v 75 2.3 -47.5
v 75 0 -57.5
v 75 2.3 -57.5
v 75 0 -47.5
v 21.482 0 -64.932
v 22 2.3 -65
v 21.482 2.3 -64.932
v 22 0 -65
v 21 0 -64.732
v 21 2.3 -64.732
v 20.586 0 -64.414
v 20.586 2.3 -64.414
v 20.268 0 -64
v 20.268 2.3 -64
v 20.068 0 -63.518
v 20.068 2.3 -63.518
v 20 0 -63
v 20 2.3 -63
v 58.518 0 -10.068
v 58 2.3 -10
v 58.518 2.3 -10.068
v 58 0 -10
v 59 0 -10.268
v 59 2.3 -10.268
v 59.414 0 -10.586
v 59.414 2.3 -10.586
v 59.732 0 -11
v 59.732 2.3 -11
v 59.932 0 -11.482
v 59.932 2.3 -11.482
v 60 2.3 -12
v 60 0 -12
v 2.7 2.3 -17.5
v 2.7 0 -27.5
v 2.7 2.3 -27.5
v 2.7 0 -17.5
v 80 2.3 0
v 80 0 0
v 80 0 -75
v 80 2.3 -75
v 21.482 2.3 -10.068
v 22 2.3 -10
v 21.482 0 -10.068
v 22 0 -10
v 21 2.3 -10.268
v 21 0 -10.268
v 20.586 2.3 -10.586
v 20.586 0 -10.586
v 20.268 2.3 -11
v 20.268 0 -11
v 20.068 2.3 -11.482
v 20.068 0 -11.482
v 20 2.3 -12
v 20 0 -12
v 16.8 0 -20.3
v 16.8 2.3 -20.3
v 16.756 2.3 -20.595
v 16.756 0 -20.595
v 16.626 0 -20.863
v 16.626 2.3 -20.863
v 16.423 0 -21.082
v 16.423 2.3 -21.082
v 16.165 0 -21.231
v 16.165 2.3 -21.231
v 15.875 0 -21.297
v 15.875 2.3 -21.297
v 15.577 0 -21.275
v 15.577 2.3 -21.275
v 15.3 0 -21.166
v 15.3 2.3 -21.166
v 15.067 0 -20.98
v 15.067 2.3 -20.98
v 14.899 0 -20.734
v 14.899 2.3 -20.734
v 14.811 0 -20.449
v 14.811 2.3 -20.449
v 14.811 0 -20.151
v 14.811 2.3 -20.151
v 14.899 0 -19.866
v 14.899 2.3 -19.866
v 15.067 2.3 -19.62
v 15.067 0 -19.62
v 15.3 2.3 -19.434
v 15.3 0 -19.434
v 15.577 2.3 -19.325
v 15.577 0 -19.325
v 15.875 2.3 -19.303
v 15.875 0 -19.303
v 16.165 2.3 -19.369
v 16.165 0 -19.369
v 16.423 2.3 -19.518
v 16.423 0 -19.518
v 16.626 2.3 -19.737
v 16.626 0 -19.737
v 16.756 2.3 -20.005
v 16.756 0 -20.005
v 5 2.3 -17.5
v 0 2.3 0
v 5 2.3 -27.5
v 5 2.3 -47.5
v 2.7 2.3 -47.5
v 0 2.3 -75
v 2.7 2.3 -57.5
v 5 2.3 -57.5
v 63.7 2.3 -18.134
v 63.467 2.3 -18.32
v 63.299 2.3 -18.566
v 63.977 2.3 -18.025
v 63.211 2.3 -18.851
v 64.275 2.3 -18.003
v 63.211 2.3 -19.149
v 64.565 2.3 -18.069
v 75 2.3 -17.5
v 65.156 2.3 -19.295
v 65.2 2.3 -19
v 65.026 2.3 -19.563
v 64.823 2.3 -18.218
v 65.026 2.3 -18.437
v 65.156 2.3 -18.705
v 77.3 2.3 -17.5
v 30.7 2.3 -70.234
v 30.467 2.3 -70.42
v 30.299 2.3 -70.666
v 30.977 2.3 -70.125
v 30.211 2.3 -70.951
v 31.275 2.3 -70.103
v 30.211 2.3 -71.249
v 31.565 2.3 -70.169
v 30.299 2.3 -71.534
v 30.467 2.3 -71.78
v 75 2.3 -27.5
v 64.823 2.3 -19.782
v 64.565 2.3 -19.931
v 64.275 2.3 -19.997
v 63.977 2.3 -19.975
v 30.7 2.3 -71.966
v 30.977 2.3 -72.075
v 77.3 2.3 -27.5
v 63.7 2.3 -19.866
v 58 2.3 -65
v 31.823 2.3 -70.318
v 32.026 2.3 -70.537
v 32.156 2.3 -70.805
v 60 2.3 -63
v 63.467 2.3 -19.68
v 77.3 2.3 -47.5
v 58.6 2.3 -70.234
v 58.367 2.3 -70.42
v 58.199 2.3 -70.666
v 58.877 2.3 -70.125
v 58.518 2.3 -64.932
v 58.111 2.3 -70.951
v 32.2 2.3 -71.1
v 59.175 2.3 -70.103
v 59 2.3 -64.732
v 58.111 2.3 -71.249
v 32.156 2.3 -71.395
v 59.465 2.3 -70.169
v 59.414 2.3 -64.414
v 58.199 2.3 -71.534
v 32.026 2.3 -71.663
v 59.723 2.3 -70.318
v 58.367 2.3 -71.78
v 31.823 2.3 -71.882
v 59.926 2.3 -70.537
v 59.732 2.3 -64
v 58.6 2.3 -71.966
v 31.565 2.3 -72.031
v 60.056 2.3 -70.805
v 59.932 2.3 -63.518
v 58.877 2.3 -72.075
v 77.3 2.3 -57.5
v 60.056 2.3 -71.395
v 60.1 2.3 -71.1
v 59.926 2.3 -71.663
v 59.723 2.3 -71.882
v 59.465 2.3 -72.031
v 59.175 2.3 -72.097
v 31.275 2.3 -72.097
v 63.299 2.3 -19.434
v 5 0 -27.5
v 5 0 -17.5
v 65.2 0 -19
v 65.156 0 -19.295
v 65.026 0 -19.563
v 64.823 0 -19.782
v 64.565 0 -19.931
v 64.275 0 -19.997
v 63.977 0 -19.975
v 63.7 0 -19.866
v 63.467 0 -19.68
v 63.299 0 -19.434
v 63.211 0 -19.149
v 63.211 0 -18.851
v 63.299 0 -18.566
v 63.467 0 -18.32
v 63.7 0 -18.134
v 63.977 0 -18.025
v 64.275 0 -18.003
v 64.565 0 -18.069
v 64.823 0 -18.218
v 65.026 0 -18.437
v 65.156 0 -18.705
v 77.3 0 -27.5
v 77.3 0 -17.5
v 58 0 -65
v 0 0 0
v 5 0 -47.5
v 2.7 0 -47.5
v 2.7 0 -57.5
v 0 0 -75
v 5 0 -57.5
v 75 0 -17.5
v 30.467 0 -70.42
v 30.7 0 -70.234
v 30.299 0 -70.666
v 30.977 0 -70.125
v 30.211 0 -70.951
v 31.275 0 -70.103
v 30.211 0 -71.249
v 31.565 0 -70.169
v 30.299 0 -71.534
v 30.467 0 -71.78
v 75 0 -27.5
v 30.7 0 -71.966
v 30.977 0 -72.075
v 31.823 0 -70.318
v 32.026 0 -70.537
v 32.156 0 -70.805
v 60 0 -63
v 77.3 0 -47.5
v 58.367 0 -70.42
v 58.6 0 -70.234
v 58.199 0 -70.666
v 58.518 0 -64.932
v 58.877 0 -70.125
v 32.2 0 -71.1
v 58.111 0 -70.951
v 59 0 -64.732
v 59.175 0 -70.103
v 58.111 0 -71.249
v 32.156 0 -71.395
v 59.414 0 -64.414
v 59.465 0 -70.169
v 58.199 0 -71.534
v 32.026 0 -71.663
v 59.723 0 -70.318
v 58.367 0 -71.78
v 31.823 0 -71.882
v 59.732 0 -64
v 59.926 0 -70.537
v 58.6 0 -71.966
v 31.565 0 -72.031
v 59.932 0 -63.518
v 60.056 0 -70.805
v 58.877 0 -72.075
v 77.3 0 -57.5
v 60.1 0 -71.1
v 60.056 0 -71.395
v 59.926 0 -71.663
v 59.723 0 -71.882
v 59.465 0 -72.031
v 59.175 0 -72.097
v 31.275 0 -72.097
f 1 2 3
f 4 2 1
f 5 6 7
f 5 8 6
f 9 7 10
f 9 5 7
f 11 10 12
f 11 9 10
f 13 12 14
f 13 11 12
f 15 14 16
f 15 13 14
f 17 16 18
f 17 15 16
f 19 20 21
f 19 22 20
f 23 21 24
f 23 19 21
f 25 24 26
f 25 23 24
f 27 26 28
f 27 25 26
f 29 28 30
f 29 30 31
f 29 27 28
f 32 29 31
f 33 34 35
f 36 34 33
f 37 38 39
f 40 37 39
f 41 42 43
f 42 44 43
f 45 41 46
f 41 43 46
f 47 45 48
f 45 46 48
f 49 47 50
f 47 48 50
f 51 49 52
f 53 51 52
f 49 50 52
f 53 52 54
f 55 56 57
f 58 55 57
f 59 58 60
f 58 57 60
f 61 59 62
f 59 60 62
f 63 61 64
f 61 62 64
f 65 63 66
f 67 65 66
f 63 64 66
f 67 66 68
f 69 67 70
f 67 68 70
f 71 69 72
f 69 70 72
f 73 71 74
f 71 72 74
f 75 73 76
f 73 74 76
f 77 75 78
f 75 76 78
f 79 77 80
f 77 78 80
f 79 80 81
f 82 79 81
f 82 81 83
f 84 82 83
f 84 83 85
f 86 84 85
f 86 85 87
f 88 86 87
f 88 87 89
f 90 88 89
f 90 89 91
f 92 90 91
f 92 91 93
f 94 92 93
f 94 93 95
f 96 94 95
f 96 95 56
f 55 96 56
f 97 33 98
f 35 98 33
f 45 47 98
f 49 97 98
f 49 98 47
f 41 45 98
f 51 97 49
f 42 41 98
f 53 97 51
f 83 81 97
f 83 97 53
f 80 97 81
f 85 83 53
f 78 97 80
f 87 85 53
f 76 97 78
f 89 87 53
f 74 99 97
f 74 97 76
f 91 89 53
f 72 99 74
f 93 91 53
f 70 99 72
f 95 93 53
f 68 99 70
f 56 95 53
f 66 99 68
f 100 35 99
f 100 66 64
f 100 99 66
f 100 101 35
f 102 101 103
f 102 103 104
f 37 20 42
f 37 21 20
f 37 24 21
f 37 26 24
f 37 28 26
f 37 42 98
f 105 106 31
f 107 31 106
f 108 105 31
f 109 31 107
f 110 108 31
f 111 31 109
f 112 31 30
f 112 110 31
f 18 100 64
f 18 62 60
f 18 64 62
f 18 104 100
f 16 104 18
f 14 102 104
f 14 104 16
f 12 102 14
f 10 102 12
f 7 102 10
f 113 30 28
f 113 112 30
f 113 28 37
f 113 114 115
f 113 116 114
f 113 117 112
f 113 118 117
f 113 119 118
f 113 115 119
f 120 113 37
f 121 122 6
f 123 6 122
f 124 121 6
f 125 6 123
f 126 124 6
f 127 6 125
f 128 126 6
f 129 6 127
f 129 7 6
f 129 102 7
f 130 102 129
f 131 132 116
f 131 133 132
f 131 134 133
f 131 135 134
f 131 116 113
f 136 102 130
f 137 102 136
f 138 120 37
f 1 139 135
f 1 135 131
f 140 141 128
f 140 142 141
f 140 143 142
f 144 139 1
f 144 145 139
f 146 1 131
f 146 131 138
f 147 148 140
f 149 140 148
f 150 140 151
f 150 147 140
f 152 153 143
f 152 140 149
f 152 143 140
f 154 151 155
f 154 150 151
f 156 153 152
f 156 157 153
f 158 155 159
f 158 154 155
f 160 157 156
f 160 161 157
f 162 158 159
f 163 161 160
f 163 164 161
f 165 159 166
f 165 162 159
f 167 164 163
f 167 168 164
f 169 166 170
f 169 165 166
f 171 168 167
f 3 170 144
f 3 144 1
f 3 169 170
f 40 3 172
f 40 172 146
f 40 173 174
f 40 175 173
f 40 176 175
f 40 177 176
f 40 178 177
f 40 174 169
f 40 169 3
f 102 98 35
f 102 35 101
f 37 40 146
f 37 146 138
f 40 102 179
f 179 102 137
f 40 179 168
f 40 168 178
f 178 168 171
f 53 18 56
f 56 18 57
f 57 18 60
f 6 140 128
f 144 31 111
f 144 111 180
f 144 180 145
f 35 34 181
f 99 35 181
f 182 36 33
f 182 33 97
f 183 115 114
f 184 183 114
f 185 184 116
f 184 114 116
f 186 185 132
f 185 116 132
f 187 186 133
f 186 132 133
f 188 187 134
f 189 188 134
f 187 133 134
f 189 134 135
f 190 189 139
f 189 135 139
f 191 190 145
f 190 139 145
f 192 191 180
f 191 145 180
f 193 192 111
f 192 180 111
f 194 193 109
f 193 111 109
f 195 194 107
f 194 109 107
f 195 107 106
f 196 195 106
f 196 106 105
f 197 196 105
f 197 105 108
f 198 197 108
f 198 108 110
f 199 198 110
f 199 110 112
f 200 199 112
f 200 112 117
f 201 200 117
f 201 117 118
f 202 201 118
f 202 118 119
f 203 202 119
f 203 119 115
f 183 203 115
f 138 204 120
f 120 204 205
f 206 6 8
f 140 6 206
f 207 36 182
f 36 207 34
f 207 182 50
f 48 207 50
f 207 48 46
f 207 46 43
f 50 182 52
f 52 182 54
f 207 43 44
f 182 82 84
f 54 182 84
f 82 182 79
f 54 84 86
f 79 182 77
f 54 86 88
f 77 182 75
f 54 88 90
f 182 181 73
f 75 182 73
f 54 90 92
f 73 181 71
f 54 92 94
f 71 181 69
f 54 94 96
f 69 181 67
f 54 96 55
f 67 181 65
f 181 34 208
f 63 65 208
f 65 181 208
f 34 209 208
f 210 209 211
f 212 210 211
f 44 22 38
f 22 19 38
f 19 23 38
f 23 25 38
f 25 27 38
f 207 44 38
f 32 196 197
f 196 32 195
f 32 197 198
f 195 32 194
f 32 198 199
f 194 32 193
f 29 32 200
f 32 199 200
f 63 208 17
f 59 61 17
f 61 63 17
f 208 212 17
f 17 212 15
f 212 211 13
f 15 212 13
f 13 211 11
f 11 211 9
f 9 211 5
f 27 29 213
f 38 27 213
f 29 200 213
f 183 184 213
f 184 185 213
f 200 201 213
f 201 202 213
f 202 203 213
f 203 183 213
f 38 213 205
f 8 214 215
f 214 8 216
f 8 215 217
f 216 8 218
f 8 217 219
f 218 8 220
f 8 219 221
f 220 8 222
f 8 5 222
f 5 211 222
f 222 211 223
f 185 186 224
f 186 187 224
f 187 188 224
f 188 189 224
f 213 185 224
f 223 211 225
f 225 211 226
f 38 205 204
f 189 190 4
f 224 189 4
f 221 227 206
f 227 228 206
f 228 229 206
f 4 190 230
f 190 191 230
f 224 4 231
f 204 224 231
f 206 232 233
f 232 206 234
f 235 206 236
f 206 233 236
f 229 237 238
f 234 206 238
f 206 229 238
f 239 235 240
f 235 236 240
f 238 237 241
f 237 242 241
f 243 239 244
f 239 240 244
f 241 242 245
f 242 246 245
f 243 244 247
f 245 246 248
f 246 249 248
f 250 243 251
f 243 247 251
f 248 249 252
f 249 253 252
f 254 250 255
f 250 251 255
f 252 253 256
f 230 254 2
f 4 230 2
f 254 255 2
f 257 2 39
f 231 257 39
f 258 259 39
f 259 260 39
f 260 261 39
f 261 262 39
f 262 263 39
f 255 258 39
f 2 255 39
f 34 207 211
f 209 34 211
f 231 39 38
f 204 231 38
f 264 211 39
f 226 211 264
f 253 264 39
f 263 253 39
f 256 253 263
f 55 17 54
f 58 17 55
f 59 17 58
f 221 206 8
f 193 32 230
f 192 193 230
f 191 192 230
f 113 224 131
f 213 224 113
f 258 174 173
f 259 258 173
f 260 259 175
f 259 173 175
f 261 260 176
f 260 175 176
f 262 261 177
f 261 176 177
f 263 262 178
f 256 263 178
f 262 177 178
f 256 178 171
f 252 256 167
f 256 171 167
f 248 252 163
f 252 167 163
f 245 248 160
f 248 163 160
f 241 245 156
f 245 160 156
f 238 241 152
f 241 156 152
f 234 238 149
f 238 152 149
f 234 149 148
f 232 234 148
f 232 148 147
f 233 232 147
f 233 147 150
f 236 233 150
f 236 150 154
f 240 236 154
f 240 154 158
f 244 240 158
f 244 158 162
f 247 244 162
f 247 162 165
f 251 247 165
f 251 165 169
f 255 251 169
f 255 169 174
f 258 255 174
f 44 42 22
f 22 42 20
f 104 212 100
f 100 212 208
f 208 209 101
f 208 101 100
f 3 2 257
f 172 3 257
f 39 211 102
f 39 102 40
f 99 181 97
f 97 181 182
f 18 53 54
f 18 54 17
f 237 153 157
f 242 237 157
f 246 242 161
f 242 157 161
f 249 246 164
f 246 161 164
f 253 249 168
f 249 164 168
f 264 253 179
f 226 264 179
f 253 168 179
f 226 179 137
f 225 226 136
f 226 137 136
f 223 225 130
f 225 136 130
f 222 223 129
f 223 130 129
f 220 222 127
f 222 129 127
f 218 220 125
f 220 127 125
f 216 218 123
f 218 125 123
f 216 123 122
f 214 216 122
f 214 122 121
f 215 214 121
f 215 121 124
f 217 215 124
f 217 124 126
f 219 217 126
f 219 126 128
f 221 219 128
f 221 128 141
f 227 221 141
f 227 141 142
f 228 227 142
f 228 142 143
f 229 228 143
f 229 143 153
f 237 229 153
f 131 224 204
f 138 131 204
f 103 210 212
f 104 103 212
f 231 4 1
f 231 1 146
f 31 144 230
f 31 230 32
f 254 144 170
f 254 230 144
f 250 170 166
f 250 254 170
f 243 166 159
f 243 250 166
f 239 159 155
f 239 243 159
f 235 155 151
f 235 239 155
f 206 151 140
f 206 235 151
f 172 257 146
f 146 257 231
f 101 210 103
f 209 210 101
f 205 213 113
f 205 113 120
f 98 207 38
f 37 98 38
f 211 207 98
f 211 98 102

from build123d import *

# Parameters (mm, degrees)
SKETCH1_W           = 80
SKETCH1_H           = 75
BOSS_EXTRUDE1_DEPTH = 2.3
SKETCH2_W           = 2.3
SKETCH2_H           = 10
CUT_EXTRUDE1_DEPTH  = 10
SKETCH3_R           = 1
CUT_EXTRUDE2_DEPTH  = 10
CUT_EXTRUDE3_DEPTH  = 10
FILLET1_R           = 2


with BuildPart() as part:
    # Sketch1 → Boss-Extrude1 (new body)
    with BuildSketch(Plane(origin=(0, 0, 0), x_dir=(1, 0, 0), z_dir=(0, 1, 0))):
        with Locations((40, 37.5)):
            Rectangle(SKETCH1_W, SKETCH1_H)
    extrude(amount=BOSS_EXTRUDE1_DEPTH)

    # Sketch2 → Cut-Extrude1 (cut)
    with BuildSketch(Plane.XZ):
        with Locations((3.85, -52.5)):
            Rectangle(SKETCH2_W, SKETCH2_H)
        with Locations((3.85, -22.5)):
            Rectangle(SKETCH2_W, SKETCH2_H)
        with Locations((76.15, -52.5)):
            Rectangle(SKETCH2_W, SKETCH2_H)
        with Locations((76.15, -22.5)):
            Rectangle(SKETCH2_W, SKETCH2_H)
    extrude(amount=-CUT_EXTRUDE1_DEPTH, mode=Mode.SUBTRACT)

    # Sketch3 → Cut-Extrude2 (cut)
    with BuildSketch(Plane(origin=(0, 2.3, 0), x_dir=(1, 0, 0), z_dir=(0, 1, 0))):
        with Locations((31.2, 71.1)):
            Circle(SKETCH3_R)
        with Locations((59.1, 71.1)):
            Circle(SKETCH3_R)
        with Locations((15.8, 20.3)):
            Circle(SKETCH3_R)
        with Locations((64.2, 19)):
            Circle(SKETCH3_R)
    extrude(amount=-CUT_EXTRUDE2_DEPTH, mode=Mode.SUBTRACT)

    # Sketch4 → Cut-Extrude3 (cut)
    with BuildSketch(Plane(origin=(0, 2.3, 0), x_dir=(1, 0, 0), z_dir=(0, 1, 0))):
        Polygon((40, 10), (20, 10), (20, 65), (60, 65), (60, 10), align=None)
    extrude(amount=-CUT_EXTRUDE3_DEPTH, mode=Mode.SUBTRACT)

    # Fillet1
    fillet1_edges = [part.edges().sort_by_distance(p)[0] for p in [
        (60, 1.15, -10),
        (20, 1.15, -10),
        (20, 1.15, -65),
        (60, 1.15, -65),
    ]]
    fillet(fillet1_edges, radius=FILLET1_R)


solid = part.part
